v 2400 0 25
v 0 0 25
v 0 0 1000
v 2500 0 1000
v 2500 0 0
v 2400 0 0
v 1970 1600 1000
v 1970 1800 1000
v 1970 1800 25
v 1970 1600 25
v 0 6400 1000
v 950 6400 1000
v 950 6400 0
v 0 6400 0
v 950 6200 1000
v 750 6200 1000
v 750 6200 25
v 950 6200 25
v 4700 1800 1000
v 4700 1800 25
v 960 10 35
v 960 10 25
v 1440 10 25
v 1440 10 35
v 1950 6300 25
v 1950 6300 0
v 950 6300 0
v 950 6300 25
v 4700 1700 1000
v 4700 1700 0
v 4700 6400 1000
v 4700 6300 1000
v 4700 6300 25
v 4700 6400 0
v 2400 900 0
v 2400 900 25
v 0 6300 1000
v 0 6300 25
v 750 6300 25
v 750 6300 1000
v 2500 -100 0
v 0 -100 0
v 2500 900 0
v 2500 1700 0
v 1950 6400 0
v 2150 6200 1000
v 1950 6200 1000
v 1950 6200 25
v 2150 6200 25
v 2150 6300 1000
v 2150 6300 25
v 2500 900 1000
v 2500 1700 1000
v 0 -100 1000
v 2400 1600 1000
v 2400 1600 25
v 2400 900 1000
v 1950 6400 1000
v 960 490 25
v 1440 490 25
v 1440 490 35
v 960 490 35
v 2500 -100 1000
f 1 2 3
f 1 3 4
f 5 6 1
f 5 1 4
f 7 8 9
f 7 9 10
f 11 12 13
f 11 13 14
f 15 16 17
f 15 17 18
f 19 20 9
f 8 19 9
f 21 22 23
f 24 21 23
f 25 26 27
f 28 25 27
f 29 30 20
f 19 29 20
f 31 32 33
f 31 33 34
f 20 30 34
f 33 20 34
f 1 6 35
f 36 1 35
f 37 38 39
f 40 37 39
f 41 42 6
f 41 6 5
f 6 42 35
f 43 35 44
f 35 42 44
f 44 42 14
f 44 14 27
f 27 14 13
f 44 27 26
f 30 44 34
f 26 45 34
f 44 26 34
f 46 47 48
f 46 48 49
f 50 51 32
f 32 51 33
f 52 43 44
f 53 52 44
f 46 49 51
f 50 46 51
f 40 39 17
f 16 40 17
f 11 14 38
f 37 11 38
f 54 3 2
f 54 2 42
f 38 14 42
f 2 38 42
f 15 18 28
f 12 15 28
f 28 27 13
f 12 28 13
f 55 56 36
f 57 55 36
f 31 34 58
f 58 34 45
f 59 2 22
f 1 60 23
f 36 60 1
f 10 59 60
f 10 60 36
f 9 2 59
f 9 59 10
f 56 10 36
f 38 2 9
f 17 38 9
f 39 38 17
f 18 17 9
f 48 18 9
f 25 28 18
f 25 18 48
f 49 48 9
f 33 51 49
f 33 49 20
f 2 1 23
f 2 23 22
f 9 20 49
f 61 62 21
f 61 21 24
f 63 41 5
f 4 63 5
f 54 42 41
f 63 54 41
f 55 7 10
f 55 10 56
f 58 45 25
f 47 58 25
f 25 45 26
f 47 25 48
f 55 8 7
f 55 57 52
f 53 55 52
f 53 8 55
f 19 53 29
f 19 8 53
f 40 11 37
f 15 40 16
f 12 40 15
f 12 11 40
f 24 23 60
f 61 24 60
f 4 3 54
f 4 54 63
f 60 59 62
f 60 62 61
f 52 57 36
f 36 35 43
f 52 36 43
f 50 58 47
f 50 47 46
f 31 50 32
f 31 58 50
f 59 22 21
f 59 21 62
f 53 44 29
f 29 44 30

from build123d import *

# Parameters (mm, degrees)
F2_DEPTH  = 1000
F4_DEPTH  = 1000
F5_W      = 2500
F5_H      = 100
F6_DEPTH  = 1000
F8_DEPTH  = 1000
F9_DEPTH  = 25
F10_W     = 480
F10_H     = 480
F11_DEPTH = 10


with BuildPart() as f2:
    # F1 (on Top) → F2 (new body)
    with BuildSketch(Plane.XY):
        Polygon((0, 6400), (0, 6300), (750, 6300), (750, 6200), (950, 6200), (950, 6400), align=None)
    extrude(amount=F2_DEPTH)



with BuildPart() as f4:
    # F3 (on Top) → F4 (new body)
    with BuildSketch(Plane.XY):
        Polygon((4700, 6300), (4700, 6400), (1950, 6400), (1950, 6200), (2150, 6200), (2150, 6300), align=None)
    extrude(amount=F4_DEPTH)


with BuildPart() as f6:
    # F5 (on Top) → F6 (new body)
    with BuildSketch(Plane.XY):
        with Locations((1250, -50)):
            Rectangle(F5_W, F5_H)
    extrude(amount=F6_DEPTH)


with BuildPart() as f8:
    # F7 (on Top) → F8 (new body)
    with BuildSketch(Plane.XY):
        Polygon((4700, 1800), (1970, 1800), (1970, 1600), (2400, 1600), (2400, 900), (2500, 900), (2500, 1700), (4700, 1700), align=None)
    extrude(amount=F8_DEPTH)


with BuildPart() as f2_1:
    add(f2.part)

    add(f4.part)  # F9 merges F4

    add(f6.part)  # F9 merges F6

    add(f8.part)  # F9 merges F8
    # F0 (on Top) → F9 (join)
    with BuildSketch(Plane.XY):
        Polygon((0, 6300), (0, 0), (2400, 0), (2400, 1600), (1970, 1600), (1970, 1800), (4700, 1800), (4700, 6300), align=None)
    extrude(amount=F9_DEPTH)

    # F10 (on face) → F11 (join)
    with BuildSketch(Plane.XY.offset(25)):
        with Locations((1200, 250)):
            Rectangle(F10_W, F10_H)
    extrude(amount=F11_DEPTH)


solid = f2_1.part
